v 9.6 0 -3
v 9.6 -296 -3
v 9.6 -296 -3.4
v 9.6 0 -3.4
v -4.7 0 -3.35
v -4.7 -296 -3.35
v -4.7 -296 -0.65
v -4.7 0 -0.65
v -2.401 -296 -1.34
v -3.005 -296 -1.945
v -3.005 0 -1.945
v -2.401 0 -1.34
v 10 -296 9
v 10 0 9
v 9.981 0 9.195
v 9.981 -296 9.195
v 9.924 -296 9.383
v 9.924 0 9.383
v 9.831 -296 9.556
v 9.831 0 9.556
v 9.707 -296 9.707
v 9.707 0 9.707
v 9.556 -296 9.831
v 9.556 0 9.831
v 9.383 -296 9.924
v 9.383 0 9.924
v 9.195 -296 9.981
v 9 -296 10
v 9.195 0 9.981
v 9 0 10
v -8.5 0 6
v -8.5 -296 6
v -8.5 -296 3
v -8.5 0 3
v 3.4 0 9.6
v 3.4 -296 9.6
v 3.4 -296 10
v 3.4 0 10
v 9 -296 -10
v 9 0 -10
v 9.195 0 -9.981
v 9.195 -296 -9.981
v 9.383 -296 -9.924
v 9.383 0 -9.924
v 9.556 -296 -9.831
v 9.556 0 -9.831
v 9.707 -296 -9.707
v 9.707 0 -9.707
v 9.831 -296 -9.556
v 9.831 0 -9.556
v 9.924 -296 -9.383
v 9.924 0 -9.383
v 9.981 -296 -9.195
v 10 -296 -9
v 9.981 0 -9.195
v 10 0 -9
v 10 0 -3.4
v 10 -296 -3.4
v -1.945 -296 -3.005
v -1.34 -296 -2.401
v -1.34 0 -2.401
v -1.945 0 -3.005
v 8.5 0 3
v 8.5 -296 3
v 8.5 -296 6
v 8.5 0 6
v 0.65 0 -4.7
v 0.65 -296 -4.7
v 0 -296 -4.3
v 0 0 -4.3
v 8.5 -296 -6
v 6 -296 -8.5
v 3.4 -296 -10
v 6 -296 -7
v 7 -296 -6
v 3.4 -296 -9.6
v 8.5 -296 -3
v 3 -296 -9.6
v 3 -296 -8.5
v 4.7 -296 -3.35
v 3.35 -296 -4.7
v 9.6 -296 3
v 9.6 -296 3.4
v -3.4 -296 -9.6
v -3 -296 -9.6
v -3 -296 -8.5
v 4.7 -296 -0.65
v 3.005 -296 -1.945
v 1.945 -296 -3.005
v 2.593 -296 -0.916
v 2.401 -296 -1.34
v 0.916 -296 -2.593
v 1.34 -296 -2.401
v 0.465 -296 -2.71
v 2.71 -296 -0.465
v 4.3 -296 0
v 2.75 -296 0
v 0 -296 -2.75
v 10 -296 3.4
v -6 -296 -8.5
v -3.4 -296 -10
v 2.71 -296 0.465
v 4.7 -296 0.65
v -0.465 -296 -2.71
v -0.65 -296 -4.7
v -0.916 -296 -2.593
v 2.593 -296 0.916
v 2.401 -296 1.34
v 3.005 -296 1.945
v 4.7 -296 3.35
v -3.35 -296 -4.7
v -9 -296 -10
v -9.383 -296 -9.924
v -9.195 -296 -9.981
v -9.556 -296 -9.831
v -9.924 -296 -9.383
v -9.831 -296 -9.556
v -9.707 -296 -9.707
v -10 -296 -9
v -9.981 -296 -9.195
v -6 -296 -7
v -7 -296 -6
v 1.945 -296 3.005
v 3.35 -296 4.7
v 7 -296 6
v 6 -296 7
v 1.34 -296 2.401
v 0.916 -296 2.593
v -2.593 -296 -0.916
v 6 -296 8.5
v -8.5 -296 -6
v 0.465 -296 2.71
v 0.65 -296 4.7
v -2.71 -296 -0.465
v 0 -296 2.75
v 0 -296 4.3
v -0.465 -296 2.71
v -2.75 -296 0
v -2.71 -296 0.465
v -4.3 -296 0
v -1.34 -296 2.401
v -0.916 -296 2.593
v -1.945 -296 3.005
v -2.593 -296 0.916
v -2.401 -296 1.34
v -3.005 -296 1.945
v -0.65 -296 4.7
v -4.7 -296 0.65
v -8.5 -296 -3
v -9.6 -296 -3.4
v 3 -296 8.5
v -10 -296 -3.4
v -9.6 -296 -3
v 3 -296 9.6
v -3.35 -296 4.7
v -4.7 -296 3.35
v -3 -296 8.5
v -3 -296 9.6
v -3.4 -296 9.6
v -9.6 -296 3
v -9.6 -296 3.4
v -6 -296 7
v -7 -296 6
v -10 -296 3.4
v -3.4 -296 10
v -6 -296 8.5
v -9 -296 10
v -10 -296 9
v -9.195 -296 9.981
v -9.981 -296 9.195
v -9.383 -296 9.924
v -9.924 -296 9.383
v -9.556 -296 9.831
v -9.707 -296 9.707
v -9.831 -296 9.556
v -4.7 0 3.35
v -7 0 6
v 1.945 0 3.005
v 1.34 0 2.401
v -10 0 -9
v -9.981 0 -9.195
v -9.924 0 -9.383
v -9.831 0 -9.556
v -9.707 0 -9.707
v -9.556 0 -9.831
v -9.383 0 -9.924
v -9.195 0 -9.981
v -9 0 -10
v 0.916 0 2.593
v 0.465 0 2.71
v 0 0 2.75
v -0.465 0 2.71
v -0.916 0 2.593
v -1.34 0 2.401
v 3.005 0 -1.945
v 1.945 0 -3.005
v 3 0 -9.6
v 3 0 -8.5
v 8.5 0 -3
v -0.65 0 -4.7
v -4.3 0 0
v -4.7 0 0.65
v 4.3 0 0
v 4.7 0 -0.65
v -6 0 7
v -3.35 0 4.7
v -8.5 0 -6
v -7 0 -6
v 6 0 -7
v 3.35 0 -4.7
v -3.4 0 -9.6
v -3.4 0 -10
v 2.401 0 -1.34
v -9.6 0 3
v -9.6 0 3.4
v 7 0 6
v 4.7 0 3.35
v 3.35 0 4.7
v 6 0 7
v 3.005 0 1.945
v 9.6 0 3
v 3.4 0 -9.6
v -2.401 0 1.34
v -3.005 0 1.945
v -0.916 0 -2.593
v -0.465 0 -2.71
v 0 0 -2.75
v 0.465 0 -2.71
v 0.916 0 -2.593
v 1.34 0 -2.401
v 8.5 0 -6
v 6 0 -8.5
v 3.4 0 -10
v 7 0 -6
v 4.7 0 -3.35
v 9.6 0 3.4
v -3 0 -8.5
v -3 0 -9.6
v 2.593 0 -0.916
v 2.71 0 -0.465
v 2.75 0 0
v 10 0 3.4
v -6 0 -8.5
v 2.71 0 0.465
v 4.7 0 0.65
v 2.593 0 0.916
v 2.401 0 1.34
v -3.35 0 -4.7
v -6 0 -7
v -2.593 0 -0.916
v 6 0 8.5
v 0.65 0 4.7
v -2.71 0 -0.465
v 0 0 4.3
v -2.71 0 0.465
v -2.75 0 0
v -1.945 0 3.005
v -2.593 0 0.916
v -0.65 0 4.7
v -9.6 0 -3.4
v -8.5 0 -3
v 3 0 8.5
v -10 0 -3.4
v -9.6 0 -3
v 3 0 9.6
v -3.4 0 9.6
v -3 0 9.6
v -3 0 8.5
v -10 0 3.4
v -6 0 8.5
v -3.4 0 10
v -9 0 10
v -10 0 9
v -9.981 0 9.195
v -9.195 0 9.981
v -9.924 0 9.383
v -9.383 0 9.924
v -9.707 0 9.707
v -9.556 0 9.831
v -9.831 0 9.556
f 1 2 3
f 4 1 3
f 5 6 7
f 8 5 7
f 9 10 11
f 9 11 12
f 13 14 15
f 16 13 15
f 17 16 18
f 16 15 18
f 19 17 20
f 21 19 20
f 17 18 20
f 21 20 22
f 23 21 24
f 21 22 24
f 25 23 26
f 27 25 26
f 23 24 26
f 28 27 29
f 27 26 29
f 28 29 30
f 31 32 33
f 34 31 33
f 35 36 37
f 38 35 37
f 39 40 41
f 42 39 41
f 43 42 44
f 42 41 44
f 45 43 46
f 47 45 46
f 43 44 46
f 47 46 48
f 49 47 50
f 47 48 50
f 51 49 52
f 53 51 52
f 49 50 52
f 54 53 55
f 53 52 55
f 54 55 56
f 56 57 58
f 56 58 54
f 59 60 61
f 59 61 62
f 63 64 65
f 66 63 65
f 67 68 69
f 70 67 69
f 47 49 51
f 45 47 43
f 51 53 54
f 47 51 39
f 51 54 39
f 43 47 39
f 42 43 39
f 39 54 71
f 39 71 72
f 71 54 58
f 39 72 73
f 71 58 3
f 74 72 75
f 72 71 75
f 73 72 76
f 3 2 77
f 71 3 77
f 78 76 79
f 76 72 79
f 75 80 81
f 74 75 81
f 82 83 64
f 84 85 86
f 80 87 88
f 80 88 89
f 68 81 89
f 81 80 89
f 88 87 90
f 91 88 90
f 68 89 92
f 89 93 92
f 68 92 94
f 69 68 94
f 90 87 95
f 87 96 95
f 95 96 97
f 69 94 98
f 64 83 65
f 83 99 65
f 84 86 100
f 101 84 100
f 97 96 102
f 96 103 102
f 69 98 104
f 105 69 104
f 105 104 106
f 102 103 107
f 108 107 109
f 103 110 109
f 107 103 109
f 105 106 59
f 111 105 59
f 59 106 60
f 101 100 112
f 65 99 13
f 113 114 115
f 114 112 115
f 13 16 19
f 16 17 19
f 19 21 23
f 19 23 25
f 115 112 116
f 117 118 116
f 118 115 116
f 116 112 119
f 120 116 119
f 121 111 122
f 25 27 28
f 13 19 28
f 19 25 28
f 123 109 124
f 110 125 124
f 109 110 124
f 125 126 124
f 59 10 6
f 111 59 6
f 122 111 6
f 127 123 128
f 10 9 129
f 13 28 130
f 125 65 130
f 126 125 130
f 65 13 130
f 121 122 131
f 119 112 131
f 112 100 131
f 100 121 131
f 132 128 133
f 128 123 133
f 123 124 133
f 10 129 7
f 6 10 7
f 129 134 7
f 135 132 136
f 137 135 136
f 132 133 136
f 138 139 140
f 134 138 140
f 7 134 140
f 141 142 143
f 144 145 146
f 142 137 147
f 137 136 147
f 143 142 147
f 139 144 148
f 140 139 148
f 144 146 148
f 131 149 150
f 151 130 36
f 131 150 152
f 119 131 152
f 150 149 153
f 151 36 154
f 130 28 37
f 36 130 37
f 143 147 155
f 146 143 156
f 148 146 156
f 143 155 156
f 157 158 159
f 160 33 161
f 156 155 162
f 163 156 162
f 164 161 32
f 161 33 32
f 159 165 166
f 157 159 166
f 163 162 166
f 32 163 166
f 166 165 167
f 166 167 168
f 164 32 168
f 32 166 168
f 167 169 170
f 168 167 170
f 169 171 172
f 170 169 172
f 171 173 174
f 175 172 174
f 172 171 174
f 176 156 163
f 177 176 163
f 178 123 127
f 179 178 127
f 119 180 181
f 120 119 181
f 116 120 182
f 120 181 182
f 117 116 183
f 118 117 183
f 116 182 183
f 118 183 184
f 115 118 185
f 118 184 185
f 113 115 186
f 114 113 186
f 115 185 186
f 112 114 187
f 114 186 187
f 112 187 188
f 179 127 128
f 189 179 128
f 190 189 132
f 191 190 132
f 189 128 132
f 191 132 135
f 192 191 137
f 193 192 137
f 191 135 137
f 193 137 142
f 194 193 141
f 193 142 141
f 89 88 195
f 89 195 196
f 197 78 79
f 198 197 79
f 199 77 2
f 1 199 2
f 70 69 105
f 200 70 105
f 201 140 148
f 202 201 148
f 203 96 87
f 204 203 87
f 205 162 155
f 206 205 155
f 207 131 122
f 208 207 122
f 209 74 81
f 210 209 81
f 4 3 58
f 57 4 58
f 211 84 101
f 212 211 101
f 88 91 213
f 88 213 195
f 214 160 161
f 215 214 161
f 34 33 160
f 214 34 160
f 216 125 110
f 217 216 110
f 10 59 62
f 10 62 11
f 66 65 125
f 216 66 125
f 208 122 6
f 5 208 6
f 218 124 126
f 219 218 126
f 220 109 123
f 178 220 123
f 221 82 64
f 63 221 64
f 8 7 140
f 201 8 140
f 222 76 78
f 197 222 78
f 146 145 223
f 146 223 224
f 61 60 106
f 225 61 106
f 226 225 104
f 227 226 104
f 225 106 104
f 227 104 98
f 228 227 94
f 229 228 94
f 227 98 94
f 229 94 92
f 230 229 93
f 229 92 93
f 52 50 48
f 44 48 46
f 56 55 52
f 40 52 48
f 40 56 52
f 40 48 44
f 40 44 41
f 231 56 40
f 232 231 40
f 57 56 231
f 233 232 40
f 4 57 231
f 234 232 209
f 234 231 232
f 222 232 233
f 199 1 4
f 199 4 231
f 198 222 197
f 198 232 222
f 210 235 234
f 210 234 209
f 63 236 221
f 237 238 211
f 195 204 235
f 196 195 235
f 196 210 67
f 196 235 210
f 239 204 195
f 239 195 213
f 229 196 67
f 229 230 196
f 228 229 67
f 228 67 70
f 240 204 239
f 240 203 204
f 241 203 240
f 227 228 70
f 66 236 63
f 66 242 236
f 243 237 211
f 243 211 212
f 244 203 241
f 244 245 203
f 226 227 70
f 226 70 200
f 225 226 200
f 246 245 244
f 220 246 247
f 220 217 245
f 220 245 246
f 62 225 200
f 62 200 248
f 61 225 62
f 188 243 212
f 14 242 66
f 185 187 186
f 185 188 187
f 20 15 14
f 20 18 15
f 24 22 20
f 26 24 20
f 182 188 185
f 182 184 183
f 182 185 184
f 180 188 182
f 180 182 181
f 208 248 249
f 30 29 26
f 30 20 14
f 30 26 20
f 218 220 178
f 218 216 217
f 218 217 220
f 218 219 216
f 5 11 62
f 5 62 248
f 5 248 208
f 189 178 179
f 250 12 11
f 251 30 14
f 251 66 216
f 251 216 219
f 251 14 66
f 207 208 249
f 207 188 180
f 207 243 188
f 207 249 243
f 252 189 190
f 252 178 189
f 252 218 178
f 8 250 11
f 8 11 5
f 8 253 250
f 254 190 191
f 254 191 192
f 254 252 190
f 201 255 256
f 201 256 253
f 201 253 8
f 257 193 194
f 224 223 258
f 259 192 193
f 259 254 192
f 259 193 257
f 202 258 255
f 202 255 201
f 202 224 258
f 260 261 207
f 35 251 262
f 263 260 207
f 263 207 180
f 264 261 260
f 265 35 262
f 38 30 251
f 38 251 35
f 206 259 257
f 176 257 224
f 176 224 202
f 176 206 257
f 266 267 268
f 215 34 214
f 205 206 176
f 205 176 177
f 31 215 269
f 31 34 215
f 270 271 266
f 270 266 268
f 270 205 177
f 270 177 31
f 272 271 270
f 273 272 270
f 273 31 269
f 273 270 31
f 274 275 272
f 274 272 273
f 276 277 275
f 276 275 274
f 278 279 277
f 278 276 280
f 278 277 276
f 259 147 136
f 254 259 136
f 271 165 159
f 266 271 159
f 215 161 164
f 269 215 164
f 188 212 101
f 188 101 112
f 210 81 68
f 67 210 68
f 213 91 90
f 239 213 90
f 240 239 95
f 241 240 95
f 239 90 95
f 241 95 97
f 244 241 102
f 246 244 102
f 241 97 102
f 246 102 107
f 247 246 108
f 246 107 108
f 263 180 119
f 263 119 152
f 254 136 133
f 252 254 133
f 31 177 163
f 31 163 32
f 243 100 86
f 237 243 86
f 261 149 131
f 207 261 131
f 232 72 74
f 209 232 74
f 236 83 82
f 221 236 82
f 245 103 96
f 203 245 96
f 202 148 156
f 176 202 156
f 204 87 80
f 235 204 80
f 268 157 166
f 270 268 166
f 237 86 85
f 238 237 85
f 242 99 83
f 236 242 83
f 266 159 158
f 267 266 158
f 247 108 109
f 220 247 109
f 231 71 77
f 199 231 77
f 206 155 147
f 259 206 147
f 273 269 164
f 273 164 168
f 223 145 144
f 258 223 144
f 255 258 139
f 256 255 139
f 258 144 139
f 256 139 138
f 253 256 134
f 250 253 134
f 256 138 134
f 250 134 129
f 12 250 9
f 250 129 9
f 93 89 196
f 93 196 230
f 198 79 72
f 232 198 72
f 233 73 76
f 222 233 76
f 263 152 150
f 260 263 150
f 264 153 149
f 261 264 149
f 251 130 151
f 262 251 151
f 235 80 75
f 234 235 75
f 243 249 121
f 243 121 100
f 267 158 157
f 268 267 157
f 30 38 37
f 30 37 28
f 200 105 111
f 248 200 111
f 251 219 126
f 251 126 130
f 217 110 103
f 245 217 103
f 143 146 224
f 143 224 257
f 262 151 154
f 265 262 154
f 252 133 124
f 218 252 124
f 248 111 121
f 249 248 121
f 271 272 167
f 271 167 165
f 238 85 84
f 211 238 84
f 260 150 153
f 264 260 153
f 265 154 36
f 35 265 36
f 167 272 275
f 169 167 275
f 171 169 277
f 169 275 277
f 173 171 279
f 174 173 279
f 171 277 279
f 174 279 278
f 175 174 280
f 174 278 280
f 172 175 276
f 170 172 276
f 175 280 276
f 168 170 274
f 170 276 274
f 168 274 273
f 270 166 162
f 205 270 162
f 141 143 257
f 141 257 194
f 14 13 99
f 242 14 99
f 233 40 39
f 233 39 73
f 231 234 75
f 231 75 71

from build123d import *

# Parameters (mm, degrees)
PAD001008_DEPTH       = 296
POCKET021004_DEPTH    = 296
POLARPATTERN002_COUNT = 4
POCKET021005_DEPTH    = 296


with BuildPart() as part:
    # Sketch043 → Pad001008 (new body)
    with BuildSketch(Plane.XZ):
        with BuildLine():
            Line((-9, 10), (9, 10))
            ThreePointArc((10, 9), (9.707107, 9.707107), (9, 10))
            Line((10, 9), (10, -9))
            ThreePointArc((9, -10), (9.707107, -9.707107), (10, -9))
            Line((9, -10), (-9, -10))
            ThreePointArc((-10, -9), (-9.707107, -9.707107), (-9, -10))
            Line((-10, -9), (-10, 9))
            ThreePointArc((-9, 10), (-9.707107, 9.707107), (-10, 9))
        make_face()
    extrude(amount=PAD001008_DEPTH)

    # Sketch042 (on Face10 of Pad001008) → Pocket021004 (cut)
    with BuildSketch(Plane.XZ.offset(296)):
        Polygon((-3.4, 10), (-3.4, 9.6), (-3, 9.6), (-3, 8.5), (-6, 8.5), (-6, 7), (-3.35, 4.7), (-0.65, 4.7), (0, 4.3), (0.65, 4.7), (3.35, 4.7), (6, 7), (6, 8.5), (3, 8.5), (3, 9.6), (3.4, 9.6), (3.4, 10), align=None)
    pocket021004 = extrude(amount=-POCKET021004_DEPTH, mode=Mode.SUBTRACT)

    # PolarPattern002: Pocket021004 ×4 about axis
    polarpattern002_axis = Axis((0, -296, 0), (0, -1, 0))
    for i in range(1, POLARPATTERN002_COUNT):
        add(pocket021004.rotate(polarpattern002_axis, i * 360 / POLARPATTERN002_COUNT), mode=Mode.SUBTRACT)

    # Sketch041 (on Face4 of PolarPattern002) → Pocket021005 (cut)
    with BuildSketch(Plane.XZ.offset(296)):
        with BuildLine():
            ThreePointArc((1.340499, 2.401159), (0, 2.75), (-1.340499, 2.401159))
            Line((-1.944544, 3.005204), (-1.340499, 2.401159))
            Line((-3.005204, 1.944544), (-1.944544, 3.005204))
            Line((-2.401159, 1.340499), (-3.005204, 1.944544))
            ThreePointArc((-2.401159, 1.340499), (-2.75, 0), (-2.401159, -1.340499))
            Line((-3.005204, -1.944544), (-2.401159, -1.340499))
            Line((-1.944544, -3.005204), (-3.005204, -1.944544))
            Line((-1.340499, -2.401159), (-1.944544, -3.005204))
            ThreePointArc((-1.340499, -2.401159), (0, -2.75), (1.340499, -2.401159))
            Line((1.944544, -3.005204), (1.340499, -2.401159))
            Line((3.005204, -1.944544), (1.944544, -3.005204))
            Line((2.401159, -1.340499), (3.005204, -1.944544))
            ThreePointArc((2.401159, -1.340499), (2.75, 0), (2.401159, 1.340499))
            Line((2.401159, 1.340499), (3.005204, 1.944544))
            Line((3.005204, 1.944544), (1.944544, 3.005204))
            Line((1.944544, 3.005204), (1.340499, 2.401159))
        make_face()
    extrude(amount=-POCKET021005_DEPTH, mode=Mode.SUBTRACT)


solid = part.part
